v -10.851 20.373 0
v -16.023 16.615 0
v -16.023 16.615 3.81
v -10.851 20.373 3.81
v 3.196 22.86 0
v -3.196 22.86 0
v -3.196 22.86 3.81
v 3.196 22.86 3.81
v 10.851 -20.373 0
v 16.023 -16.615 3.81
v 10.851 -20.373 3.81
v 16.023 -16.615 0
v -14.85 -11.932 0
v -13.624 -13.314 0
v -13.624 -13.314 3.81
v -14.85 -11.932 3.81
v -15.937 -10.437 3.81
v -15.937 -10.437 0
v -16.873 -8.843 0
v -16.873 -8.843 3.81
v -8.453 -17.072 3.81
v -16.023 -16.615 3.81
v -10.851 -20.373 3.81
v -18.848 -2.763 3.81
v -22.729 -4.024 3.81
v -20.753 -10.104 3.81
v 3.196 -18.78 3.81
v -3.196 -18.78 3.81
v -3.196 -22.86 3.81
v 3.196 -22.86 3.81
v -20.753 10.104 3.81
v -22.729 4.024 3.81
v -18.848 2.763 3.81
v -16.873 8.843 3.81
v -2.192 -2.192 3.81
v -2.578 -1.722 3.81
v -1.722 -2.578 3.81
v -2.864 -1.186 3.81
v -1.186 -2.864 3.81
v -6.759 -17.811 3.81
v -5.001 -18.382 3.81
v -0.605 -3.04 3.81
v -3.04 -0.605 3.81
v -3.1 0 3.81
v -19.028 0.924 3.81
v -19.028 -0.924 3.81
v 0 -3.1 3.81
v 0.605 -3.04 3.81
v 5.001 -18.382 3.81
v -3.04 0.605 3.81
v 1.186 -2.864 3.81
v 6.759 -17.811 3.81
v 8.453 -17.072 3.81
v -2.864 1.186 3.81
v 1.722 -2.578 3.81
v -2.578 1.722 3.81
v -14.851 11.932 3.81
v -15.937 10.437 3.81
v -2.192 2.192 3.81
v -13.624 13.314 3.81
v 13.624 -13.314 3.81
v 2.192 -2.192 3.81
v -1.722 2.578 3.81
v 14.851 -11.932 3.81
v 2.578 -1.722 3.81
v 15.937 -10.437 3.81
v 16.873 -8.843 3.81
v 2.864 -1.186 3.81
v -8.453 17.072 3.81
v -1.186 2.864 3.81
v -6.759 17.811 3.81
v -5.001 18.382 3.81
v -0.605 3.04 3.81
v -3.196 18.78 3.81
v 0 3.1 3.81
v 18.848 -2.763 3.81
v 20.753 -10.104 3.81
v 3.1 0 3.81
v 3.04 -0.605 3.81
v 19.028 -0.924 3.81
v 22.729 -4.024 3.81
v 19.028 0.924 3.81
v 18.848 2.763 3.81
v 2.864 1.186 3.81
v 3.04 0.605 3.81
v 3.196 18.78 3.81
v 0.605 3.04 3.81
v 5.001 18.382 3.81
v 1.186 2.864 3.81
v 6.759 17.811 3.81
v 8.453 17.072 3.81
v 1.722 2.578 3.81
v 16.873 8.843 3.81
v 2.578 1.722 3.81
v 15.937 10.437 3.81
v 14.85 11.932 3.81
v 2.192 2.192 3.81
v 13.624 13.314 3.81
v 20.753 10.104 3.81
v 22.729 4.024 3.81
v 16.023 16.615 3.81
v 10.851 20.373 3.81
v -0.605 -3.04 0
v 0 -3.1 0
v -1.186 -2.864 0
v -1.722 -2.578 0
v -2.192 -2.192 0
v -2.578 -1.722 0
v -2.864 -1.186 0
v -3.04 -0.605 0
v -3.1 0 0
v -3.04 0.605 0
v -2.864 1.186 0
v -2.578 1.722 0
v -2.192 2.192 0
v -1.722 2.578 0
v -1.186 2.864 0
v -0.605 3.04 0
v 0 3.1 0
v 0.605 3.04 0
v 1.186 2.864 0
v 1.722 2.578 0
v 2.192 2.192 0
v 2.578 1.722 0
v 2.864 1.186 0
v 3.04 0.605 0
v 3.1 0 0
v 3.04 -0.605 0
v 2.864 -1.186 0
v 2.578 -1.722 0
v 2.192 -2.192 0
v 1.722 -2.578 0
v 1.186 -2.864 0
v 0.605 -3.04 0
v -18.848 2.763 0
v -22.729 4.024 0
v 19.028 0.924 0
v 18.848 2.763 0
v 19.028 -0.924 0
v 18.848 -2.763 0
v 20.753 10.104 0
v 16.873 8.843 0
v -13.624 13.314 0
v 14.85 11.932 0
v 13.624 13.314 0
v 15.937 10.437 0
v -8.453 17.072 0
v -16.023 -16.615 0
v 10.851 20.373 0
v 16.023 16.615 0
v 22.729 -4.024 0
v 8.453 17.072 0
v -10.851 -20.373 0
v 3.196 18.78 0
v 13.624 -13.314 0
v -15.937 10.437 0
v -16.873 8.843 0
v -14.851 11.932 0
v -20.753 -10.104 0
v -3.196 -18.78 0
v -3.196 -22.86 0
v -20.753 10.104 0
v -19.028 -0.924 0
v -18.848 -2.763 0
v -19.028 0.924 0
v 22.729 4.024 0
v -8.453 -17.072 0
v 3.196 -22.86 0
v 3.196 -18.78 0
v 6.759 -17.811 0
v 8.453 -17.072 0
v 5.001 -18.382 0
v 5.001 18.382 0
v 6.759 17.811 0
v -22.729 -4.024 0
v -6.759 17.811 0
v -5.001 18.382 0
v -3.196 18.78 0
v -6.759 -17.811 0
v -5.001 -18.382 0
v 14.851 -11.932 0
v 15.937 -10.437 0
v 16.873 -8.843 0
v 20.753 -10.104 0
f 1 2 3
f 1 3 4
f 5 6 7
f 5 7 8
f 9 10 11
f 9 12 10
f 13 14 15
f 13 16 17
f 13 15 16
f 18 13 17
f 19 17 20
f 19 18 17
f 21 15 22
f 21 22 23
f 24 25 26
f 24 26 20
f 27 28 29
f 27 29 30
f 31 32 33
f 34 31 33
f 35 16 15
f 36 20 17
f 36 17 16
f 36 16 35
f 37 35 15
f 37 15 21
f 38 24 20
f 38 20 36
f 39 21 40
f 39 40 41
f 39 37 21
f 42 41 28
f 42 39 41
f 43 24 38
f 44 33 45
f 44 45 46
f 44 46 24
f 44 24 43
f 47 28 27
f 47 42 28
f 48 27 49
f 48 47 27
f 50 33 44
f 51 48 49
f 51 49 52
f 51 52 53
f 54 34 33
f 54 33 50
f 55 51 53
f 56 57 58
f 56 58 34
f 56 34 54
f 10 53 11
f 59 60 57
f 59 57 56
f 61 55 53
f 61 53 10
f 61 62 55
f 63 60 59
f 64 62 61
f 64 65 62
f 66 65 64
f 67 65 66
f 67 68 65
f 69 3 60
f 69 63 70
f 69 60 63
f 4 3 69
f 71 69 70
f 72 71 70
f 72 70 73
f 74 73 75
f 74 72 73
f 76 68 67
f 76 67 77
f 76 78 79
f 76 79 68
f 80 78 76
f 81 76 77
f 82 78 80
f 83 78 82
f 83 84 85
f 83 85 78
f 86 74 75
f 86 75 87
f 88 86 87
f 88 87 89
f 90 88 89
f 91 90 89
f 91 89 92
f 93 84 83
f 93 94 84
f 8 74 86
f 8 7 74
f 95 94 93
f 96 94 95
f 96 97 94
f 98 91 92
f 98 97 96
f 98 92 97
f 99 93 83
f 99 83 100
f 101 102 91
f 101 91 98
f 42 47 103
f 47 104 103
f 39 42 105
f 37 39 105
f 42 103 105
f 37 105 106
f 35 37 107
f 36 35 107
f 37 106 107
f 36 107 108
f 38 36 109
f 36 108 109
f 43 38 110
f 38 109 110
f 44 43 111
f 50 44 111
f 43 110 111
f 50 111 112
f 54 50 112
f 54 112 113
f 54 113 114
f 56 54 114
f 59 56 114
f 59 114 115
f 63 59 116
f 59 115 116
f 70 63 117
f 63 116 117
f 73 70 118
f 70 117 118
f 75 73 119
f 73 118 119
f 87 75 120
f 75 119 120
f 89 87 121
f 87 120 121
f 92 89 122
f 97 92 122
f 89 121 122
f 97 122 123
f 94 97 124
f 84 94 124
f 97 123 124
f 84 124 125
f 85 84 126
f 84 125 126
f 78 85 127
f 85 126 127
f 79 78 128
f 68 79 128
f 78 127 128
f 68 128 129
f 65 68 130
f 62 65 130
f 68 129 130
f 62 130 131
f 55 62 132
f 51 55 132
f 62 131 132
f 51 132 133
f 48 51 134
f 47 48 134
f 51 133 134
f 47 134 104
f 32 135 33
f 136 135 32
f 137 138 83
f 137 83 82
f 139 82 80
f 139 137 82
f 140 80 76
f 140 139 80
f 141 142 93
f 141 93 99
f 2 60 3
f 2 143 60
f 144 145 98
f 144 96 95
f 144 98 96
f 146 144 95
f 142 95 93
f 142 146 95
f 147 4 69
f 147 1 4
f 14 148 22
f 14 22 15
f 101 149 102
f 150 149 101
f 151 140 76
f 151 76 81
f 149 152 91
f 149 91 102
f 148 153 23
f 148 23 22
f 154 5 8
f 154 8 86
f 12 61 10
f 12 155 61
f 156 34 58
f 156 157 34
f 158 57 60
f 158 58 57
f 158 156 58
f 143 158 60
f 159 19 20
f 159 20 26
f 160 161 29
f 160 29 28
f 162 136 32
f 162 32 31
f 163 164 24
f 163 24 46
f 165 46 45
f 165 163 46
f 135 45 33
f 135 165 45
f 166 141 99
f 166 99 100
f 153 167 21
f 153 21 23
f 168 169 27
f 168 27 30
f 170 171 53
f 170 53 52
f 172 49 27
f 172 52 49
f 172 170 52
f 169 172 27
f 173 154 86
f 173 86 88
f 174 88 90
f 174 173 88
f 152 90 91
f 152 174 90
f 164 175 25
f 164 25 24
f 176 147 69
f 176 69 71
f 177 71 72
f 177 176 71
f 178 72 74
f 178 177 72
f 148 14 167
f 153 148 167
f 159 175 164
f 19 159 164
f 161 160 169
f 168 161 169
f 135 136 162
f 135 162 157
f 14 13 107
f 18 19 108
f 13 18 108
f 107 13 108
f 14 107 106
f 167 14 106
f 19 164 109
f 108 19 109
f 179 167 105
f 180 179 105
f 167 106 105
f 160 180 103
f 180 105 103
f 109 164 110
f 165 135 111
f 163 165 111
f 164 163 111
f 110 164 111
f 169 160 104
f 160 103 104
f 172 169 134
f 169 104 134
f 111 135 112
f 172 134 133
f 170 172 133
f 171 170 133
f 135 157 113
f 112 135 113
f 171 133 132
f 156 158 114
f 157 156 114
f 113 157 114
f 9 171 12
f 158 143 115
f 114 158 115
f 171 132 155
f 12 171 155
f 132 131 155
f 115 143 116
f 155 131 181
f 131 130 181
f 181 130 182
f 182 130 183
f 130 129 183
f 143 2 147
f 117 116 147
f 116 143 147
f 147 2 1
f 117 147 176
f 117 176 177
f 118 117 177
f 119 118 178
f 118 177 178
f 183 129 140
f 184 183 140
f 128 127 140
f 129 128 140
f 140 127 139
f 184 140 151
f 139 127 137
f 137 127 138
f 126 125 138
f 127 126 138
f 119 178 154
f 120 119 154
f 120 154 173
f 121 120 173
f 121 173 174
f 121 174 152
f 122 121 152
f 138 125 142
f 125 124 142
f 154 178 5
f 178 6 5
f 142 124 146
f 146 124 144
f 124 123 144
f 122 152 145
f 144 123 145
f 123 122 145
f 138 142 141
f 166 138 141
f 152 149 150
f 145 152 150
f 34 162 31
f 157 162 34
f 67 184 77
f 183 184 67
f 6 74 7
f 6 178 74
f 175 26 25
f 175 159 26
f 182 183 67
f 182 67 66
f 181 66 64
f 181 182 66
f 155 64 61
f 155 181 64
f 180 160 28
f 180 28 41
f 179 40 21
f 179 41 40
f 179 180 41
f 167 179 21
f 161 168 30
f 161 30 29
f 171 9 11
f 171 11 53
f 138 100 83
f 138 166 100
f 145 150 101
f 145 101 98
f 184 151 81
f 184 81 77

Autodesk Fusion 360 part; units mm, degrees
sketch "wheel" plane through (0, 0, 0) normal (0, 0, 1) x (1, 0, 0)
  circle A0 centre (0, 0) radius 19.05
  line L0 (-3.1964, 18.7799) -> (-3.1964, 22.86)
  line L1 (-3.1964, 22.86) -> (3.1964, 22.86)
  line L2 (3.1964, 22.86) -> (3.1964, 18.7799)
  line L3 (-13.6245, 13.3144) -> (-16.0227, 16.6153)
  line L4 (-16.0227, 16.6153) -> (-10.8508, 20.3729)
  line L5 (-10.8508, 20.3729) -> (-8.4526, 17.0721)
  line L6 (-18.8485, 2.7633) -> (-22.7289, 4.0241)
  line L7 (-22.7289, 4.0241) -> (-20.7534, 10.1041)
  line L8 (-20.7534, 10.1041) -> (-16.873, 8.8433)
  line L9 (-16.873, -8.8433) -> (-20.7534, -10.1041)
  line L10 (-20.7534, -10.1041) -> (-22.7289, -4.0241)
  line L11 (-22.7289, -4.0241) -> (-18.8485, -2.7633)
  line L12 (-8.4526, -17.0721) -> (-10.8508, -20.373)
  line L13 (-10.8508, -20.373) -> (-16.0227, -16.6153)
  line L14 (-16.0227, -16.6153) -> (-13.6245, -13.3145)
  line L15 (3.1964, -18.7799) -> (3.1964, -22.86)
  line L16 (3.1964, -22.86) -> (-3.1964, -22.86)
  line L17 (-3.1964, -22.86) -> (-3.1964, -18.7799)
  line L18 (13.6245, -13.3144) -> (16.0227, -16.6153)
  line L19 (16.0227, -16.6153) -> (10.8508, -20.3729)
  line L20 (10.8508, -20.3729) -> (8.4526, -17.0721)
  line L21 (18.8485, -2.7633) -> (22.7289, -4.0241)
  line L22 (22.7289, -4.0241) -> (20.7534, -10.1041)
  line L23 (20.7534, -10.1041) -> (16.873, -8.8433)
  line L24 (16.873, 8.8433) -> (20.7534, 10.1041)
  line L25 (20.7534, 10.1041) -> (22.7289, 4.0241)
  line L26 (22.7289, 4.0241) -> (18.8485, 2.7633)
  line L27 (8.4526, 17.0721) -> (10.8508, 20.373)
  line L28 (10.8508, 20.373) -> (16.0227, 16.6153)
  line L29 (16.0227, 16.6153) -> (13.6245, 13.3145)
  dimension "d1" = 38.1
  dimension "d2" = 6.3929
  dimension "d3" = 4.0801
  dimension "d5" = 360
extrude "Extrude1" add sketch "wheel" along normal blind 3.81
sketch "hole punch" plane through (0, 0, 3.81) normal (0, 0, 1) x (-1, 0, 0)
  arc A0 (-8.4526, -17.0721) -> (-3.1964, -18.7799) centre (0, 0) ccw
  line L0 (-3.1964, -18.7799) -> (-3.1964, -22.86)
  line L1 (-3.1964, -22.86) -> (3.1964, -22.86)
  line L2 (3.1964, -22.86) -> (3.1964, -18.7799)
  arc A1 (3.1964, -18.7799) -> (8.4526, -17.0721) centre (0, 0) ccw
  line L3 (8.4526, -17.0721) -> (10.8508, -20.3729)
  line L4 (10.8508, -20.3729) -> (16.0227, -16.6153)
  line L5 (16.0227, -16.6153) -> (13.6245, -13.3144)
  arc A2 (13.6245, -13.3144) -> (16.873, -8.8433) centre (0, 0) ccw
  line L6 (16.873, -8.8433) -> (20.7534, -10.1041)
  line L7 (20.7534, -10.1041) -> (22.7289, -4.0241)
  line L8 (22.7289, -4.0241) -> (18.8485, -2.7633)
  arc A3 (18.8485, -2.7633) -> (18.8485, 2.7633) centre (0, 0) ccw
  line L9 (18.8485, 2.7633) -> (22.7289, 4.0241)
  line L10 (22.7289, 4.0241) -> (20.7534, 10.1041)
  line L11 (20.7534, 10.1041) -> (16.873, 8.8433)
  arc A4 (16.873, 8.8433) -> (13.6245, 13.3145) centre (0, 0) ccw
  line L12 (13.6245, 13.3145) -> (16.0227, 16.6153)
  line L13 (16.0227, 16.6153) -> (10.8508, 20.373)
  line L14 (10.8508, 20.373) -> (8.4526, 17.0721)
  arc A5 (8.4526, 17.0721) -> (3.1964, 18.7799) centre (0, 0) ccw
  line L15 (3.1964, 18.7799) -> (3.1964, 22.86)
  line L16 (3.1964, 22.86) -> (-3.1964, 22.86)
  line L17 (-3.1964, 22.86) -> (-3.1964, 18.7799)
  arc A6 (-3.1964, 18.7799) -> (-8.4526, 17.0721) centre (0, 0) ccw
  line L18 (-8.4526, 17.0721) -> (-10.8508, 20.3729)
  line L19 (-10.8508, 20.3729) -> (-16.0227, 16.6153)
  line L20 (-16.0227, 16.6153) -> (-13.6245, 13.3144)
  arc A7 (-13.6245, 13.3144) -> (-16.873, 8.8433) centre (0, 0) ccw
  line L21 (-16.873, 8.8433) -> (-20.7534, 10.1041)
  line L22 (-20.7534, 10.1041) -> (-22.7289, 4.0241)
  line L23 (-22.7289, 4.0241) -> (-18.8485, 2.7633)
  arc A8 (-18.8485, 2.7633) -> (-18.8485, -2.7633) centre (0, 0) ccw
  line L24 (-18.8485, -2.7633) -> (-22.7289, -4.0241)
  line L25 (-22.7289, -4.0241) -> (-20.7534, -10.1041)
  line L26 (-20.7534, -10.1041) -> (-16.873, -8.8433)
  arc A9 (-16.873, -8.8433) -> (-13.6245, -13.3145) centre (0, 0) ccw
  line L27 (-13.6245, -13.3145) -> (-16.0227, -16.6153)
  line L28 (-16.0227, -16.6153) -> (-10.8508, -20.373)
  line L29 (-10.8508, -20.373) -> (-8.4526, -17.0721)
  circle A10 centre (0, 0) radius 19.05
  line L30 (0.0528, -19.0499) -> (0.0528, 19.0499)
  line L31 (19.05, 0) -> (-19.05, 0)
hole "Hole1" at (0, 0, 3.81) direction (0, 0, -1) diameter 6.2 depth 6.2 tip angle 118
